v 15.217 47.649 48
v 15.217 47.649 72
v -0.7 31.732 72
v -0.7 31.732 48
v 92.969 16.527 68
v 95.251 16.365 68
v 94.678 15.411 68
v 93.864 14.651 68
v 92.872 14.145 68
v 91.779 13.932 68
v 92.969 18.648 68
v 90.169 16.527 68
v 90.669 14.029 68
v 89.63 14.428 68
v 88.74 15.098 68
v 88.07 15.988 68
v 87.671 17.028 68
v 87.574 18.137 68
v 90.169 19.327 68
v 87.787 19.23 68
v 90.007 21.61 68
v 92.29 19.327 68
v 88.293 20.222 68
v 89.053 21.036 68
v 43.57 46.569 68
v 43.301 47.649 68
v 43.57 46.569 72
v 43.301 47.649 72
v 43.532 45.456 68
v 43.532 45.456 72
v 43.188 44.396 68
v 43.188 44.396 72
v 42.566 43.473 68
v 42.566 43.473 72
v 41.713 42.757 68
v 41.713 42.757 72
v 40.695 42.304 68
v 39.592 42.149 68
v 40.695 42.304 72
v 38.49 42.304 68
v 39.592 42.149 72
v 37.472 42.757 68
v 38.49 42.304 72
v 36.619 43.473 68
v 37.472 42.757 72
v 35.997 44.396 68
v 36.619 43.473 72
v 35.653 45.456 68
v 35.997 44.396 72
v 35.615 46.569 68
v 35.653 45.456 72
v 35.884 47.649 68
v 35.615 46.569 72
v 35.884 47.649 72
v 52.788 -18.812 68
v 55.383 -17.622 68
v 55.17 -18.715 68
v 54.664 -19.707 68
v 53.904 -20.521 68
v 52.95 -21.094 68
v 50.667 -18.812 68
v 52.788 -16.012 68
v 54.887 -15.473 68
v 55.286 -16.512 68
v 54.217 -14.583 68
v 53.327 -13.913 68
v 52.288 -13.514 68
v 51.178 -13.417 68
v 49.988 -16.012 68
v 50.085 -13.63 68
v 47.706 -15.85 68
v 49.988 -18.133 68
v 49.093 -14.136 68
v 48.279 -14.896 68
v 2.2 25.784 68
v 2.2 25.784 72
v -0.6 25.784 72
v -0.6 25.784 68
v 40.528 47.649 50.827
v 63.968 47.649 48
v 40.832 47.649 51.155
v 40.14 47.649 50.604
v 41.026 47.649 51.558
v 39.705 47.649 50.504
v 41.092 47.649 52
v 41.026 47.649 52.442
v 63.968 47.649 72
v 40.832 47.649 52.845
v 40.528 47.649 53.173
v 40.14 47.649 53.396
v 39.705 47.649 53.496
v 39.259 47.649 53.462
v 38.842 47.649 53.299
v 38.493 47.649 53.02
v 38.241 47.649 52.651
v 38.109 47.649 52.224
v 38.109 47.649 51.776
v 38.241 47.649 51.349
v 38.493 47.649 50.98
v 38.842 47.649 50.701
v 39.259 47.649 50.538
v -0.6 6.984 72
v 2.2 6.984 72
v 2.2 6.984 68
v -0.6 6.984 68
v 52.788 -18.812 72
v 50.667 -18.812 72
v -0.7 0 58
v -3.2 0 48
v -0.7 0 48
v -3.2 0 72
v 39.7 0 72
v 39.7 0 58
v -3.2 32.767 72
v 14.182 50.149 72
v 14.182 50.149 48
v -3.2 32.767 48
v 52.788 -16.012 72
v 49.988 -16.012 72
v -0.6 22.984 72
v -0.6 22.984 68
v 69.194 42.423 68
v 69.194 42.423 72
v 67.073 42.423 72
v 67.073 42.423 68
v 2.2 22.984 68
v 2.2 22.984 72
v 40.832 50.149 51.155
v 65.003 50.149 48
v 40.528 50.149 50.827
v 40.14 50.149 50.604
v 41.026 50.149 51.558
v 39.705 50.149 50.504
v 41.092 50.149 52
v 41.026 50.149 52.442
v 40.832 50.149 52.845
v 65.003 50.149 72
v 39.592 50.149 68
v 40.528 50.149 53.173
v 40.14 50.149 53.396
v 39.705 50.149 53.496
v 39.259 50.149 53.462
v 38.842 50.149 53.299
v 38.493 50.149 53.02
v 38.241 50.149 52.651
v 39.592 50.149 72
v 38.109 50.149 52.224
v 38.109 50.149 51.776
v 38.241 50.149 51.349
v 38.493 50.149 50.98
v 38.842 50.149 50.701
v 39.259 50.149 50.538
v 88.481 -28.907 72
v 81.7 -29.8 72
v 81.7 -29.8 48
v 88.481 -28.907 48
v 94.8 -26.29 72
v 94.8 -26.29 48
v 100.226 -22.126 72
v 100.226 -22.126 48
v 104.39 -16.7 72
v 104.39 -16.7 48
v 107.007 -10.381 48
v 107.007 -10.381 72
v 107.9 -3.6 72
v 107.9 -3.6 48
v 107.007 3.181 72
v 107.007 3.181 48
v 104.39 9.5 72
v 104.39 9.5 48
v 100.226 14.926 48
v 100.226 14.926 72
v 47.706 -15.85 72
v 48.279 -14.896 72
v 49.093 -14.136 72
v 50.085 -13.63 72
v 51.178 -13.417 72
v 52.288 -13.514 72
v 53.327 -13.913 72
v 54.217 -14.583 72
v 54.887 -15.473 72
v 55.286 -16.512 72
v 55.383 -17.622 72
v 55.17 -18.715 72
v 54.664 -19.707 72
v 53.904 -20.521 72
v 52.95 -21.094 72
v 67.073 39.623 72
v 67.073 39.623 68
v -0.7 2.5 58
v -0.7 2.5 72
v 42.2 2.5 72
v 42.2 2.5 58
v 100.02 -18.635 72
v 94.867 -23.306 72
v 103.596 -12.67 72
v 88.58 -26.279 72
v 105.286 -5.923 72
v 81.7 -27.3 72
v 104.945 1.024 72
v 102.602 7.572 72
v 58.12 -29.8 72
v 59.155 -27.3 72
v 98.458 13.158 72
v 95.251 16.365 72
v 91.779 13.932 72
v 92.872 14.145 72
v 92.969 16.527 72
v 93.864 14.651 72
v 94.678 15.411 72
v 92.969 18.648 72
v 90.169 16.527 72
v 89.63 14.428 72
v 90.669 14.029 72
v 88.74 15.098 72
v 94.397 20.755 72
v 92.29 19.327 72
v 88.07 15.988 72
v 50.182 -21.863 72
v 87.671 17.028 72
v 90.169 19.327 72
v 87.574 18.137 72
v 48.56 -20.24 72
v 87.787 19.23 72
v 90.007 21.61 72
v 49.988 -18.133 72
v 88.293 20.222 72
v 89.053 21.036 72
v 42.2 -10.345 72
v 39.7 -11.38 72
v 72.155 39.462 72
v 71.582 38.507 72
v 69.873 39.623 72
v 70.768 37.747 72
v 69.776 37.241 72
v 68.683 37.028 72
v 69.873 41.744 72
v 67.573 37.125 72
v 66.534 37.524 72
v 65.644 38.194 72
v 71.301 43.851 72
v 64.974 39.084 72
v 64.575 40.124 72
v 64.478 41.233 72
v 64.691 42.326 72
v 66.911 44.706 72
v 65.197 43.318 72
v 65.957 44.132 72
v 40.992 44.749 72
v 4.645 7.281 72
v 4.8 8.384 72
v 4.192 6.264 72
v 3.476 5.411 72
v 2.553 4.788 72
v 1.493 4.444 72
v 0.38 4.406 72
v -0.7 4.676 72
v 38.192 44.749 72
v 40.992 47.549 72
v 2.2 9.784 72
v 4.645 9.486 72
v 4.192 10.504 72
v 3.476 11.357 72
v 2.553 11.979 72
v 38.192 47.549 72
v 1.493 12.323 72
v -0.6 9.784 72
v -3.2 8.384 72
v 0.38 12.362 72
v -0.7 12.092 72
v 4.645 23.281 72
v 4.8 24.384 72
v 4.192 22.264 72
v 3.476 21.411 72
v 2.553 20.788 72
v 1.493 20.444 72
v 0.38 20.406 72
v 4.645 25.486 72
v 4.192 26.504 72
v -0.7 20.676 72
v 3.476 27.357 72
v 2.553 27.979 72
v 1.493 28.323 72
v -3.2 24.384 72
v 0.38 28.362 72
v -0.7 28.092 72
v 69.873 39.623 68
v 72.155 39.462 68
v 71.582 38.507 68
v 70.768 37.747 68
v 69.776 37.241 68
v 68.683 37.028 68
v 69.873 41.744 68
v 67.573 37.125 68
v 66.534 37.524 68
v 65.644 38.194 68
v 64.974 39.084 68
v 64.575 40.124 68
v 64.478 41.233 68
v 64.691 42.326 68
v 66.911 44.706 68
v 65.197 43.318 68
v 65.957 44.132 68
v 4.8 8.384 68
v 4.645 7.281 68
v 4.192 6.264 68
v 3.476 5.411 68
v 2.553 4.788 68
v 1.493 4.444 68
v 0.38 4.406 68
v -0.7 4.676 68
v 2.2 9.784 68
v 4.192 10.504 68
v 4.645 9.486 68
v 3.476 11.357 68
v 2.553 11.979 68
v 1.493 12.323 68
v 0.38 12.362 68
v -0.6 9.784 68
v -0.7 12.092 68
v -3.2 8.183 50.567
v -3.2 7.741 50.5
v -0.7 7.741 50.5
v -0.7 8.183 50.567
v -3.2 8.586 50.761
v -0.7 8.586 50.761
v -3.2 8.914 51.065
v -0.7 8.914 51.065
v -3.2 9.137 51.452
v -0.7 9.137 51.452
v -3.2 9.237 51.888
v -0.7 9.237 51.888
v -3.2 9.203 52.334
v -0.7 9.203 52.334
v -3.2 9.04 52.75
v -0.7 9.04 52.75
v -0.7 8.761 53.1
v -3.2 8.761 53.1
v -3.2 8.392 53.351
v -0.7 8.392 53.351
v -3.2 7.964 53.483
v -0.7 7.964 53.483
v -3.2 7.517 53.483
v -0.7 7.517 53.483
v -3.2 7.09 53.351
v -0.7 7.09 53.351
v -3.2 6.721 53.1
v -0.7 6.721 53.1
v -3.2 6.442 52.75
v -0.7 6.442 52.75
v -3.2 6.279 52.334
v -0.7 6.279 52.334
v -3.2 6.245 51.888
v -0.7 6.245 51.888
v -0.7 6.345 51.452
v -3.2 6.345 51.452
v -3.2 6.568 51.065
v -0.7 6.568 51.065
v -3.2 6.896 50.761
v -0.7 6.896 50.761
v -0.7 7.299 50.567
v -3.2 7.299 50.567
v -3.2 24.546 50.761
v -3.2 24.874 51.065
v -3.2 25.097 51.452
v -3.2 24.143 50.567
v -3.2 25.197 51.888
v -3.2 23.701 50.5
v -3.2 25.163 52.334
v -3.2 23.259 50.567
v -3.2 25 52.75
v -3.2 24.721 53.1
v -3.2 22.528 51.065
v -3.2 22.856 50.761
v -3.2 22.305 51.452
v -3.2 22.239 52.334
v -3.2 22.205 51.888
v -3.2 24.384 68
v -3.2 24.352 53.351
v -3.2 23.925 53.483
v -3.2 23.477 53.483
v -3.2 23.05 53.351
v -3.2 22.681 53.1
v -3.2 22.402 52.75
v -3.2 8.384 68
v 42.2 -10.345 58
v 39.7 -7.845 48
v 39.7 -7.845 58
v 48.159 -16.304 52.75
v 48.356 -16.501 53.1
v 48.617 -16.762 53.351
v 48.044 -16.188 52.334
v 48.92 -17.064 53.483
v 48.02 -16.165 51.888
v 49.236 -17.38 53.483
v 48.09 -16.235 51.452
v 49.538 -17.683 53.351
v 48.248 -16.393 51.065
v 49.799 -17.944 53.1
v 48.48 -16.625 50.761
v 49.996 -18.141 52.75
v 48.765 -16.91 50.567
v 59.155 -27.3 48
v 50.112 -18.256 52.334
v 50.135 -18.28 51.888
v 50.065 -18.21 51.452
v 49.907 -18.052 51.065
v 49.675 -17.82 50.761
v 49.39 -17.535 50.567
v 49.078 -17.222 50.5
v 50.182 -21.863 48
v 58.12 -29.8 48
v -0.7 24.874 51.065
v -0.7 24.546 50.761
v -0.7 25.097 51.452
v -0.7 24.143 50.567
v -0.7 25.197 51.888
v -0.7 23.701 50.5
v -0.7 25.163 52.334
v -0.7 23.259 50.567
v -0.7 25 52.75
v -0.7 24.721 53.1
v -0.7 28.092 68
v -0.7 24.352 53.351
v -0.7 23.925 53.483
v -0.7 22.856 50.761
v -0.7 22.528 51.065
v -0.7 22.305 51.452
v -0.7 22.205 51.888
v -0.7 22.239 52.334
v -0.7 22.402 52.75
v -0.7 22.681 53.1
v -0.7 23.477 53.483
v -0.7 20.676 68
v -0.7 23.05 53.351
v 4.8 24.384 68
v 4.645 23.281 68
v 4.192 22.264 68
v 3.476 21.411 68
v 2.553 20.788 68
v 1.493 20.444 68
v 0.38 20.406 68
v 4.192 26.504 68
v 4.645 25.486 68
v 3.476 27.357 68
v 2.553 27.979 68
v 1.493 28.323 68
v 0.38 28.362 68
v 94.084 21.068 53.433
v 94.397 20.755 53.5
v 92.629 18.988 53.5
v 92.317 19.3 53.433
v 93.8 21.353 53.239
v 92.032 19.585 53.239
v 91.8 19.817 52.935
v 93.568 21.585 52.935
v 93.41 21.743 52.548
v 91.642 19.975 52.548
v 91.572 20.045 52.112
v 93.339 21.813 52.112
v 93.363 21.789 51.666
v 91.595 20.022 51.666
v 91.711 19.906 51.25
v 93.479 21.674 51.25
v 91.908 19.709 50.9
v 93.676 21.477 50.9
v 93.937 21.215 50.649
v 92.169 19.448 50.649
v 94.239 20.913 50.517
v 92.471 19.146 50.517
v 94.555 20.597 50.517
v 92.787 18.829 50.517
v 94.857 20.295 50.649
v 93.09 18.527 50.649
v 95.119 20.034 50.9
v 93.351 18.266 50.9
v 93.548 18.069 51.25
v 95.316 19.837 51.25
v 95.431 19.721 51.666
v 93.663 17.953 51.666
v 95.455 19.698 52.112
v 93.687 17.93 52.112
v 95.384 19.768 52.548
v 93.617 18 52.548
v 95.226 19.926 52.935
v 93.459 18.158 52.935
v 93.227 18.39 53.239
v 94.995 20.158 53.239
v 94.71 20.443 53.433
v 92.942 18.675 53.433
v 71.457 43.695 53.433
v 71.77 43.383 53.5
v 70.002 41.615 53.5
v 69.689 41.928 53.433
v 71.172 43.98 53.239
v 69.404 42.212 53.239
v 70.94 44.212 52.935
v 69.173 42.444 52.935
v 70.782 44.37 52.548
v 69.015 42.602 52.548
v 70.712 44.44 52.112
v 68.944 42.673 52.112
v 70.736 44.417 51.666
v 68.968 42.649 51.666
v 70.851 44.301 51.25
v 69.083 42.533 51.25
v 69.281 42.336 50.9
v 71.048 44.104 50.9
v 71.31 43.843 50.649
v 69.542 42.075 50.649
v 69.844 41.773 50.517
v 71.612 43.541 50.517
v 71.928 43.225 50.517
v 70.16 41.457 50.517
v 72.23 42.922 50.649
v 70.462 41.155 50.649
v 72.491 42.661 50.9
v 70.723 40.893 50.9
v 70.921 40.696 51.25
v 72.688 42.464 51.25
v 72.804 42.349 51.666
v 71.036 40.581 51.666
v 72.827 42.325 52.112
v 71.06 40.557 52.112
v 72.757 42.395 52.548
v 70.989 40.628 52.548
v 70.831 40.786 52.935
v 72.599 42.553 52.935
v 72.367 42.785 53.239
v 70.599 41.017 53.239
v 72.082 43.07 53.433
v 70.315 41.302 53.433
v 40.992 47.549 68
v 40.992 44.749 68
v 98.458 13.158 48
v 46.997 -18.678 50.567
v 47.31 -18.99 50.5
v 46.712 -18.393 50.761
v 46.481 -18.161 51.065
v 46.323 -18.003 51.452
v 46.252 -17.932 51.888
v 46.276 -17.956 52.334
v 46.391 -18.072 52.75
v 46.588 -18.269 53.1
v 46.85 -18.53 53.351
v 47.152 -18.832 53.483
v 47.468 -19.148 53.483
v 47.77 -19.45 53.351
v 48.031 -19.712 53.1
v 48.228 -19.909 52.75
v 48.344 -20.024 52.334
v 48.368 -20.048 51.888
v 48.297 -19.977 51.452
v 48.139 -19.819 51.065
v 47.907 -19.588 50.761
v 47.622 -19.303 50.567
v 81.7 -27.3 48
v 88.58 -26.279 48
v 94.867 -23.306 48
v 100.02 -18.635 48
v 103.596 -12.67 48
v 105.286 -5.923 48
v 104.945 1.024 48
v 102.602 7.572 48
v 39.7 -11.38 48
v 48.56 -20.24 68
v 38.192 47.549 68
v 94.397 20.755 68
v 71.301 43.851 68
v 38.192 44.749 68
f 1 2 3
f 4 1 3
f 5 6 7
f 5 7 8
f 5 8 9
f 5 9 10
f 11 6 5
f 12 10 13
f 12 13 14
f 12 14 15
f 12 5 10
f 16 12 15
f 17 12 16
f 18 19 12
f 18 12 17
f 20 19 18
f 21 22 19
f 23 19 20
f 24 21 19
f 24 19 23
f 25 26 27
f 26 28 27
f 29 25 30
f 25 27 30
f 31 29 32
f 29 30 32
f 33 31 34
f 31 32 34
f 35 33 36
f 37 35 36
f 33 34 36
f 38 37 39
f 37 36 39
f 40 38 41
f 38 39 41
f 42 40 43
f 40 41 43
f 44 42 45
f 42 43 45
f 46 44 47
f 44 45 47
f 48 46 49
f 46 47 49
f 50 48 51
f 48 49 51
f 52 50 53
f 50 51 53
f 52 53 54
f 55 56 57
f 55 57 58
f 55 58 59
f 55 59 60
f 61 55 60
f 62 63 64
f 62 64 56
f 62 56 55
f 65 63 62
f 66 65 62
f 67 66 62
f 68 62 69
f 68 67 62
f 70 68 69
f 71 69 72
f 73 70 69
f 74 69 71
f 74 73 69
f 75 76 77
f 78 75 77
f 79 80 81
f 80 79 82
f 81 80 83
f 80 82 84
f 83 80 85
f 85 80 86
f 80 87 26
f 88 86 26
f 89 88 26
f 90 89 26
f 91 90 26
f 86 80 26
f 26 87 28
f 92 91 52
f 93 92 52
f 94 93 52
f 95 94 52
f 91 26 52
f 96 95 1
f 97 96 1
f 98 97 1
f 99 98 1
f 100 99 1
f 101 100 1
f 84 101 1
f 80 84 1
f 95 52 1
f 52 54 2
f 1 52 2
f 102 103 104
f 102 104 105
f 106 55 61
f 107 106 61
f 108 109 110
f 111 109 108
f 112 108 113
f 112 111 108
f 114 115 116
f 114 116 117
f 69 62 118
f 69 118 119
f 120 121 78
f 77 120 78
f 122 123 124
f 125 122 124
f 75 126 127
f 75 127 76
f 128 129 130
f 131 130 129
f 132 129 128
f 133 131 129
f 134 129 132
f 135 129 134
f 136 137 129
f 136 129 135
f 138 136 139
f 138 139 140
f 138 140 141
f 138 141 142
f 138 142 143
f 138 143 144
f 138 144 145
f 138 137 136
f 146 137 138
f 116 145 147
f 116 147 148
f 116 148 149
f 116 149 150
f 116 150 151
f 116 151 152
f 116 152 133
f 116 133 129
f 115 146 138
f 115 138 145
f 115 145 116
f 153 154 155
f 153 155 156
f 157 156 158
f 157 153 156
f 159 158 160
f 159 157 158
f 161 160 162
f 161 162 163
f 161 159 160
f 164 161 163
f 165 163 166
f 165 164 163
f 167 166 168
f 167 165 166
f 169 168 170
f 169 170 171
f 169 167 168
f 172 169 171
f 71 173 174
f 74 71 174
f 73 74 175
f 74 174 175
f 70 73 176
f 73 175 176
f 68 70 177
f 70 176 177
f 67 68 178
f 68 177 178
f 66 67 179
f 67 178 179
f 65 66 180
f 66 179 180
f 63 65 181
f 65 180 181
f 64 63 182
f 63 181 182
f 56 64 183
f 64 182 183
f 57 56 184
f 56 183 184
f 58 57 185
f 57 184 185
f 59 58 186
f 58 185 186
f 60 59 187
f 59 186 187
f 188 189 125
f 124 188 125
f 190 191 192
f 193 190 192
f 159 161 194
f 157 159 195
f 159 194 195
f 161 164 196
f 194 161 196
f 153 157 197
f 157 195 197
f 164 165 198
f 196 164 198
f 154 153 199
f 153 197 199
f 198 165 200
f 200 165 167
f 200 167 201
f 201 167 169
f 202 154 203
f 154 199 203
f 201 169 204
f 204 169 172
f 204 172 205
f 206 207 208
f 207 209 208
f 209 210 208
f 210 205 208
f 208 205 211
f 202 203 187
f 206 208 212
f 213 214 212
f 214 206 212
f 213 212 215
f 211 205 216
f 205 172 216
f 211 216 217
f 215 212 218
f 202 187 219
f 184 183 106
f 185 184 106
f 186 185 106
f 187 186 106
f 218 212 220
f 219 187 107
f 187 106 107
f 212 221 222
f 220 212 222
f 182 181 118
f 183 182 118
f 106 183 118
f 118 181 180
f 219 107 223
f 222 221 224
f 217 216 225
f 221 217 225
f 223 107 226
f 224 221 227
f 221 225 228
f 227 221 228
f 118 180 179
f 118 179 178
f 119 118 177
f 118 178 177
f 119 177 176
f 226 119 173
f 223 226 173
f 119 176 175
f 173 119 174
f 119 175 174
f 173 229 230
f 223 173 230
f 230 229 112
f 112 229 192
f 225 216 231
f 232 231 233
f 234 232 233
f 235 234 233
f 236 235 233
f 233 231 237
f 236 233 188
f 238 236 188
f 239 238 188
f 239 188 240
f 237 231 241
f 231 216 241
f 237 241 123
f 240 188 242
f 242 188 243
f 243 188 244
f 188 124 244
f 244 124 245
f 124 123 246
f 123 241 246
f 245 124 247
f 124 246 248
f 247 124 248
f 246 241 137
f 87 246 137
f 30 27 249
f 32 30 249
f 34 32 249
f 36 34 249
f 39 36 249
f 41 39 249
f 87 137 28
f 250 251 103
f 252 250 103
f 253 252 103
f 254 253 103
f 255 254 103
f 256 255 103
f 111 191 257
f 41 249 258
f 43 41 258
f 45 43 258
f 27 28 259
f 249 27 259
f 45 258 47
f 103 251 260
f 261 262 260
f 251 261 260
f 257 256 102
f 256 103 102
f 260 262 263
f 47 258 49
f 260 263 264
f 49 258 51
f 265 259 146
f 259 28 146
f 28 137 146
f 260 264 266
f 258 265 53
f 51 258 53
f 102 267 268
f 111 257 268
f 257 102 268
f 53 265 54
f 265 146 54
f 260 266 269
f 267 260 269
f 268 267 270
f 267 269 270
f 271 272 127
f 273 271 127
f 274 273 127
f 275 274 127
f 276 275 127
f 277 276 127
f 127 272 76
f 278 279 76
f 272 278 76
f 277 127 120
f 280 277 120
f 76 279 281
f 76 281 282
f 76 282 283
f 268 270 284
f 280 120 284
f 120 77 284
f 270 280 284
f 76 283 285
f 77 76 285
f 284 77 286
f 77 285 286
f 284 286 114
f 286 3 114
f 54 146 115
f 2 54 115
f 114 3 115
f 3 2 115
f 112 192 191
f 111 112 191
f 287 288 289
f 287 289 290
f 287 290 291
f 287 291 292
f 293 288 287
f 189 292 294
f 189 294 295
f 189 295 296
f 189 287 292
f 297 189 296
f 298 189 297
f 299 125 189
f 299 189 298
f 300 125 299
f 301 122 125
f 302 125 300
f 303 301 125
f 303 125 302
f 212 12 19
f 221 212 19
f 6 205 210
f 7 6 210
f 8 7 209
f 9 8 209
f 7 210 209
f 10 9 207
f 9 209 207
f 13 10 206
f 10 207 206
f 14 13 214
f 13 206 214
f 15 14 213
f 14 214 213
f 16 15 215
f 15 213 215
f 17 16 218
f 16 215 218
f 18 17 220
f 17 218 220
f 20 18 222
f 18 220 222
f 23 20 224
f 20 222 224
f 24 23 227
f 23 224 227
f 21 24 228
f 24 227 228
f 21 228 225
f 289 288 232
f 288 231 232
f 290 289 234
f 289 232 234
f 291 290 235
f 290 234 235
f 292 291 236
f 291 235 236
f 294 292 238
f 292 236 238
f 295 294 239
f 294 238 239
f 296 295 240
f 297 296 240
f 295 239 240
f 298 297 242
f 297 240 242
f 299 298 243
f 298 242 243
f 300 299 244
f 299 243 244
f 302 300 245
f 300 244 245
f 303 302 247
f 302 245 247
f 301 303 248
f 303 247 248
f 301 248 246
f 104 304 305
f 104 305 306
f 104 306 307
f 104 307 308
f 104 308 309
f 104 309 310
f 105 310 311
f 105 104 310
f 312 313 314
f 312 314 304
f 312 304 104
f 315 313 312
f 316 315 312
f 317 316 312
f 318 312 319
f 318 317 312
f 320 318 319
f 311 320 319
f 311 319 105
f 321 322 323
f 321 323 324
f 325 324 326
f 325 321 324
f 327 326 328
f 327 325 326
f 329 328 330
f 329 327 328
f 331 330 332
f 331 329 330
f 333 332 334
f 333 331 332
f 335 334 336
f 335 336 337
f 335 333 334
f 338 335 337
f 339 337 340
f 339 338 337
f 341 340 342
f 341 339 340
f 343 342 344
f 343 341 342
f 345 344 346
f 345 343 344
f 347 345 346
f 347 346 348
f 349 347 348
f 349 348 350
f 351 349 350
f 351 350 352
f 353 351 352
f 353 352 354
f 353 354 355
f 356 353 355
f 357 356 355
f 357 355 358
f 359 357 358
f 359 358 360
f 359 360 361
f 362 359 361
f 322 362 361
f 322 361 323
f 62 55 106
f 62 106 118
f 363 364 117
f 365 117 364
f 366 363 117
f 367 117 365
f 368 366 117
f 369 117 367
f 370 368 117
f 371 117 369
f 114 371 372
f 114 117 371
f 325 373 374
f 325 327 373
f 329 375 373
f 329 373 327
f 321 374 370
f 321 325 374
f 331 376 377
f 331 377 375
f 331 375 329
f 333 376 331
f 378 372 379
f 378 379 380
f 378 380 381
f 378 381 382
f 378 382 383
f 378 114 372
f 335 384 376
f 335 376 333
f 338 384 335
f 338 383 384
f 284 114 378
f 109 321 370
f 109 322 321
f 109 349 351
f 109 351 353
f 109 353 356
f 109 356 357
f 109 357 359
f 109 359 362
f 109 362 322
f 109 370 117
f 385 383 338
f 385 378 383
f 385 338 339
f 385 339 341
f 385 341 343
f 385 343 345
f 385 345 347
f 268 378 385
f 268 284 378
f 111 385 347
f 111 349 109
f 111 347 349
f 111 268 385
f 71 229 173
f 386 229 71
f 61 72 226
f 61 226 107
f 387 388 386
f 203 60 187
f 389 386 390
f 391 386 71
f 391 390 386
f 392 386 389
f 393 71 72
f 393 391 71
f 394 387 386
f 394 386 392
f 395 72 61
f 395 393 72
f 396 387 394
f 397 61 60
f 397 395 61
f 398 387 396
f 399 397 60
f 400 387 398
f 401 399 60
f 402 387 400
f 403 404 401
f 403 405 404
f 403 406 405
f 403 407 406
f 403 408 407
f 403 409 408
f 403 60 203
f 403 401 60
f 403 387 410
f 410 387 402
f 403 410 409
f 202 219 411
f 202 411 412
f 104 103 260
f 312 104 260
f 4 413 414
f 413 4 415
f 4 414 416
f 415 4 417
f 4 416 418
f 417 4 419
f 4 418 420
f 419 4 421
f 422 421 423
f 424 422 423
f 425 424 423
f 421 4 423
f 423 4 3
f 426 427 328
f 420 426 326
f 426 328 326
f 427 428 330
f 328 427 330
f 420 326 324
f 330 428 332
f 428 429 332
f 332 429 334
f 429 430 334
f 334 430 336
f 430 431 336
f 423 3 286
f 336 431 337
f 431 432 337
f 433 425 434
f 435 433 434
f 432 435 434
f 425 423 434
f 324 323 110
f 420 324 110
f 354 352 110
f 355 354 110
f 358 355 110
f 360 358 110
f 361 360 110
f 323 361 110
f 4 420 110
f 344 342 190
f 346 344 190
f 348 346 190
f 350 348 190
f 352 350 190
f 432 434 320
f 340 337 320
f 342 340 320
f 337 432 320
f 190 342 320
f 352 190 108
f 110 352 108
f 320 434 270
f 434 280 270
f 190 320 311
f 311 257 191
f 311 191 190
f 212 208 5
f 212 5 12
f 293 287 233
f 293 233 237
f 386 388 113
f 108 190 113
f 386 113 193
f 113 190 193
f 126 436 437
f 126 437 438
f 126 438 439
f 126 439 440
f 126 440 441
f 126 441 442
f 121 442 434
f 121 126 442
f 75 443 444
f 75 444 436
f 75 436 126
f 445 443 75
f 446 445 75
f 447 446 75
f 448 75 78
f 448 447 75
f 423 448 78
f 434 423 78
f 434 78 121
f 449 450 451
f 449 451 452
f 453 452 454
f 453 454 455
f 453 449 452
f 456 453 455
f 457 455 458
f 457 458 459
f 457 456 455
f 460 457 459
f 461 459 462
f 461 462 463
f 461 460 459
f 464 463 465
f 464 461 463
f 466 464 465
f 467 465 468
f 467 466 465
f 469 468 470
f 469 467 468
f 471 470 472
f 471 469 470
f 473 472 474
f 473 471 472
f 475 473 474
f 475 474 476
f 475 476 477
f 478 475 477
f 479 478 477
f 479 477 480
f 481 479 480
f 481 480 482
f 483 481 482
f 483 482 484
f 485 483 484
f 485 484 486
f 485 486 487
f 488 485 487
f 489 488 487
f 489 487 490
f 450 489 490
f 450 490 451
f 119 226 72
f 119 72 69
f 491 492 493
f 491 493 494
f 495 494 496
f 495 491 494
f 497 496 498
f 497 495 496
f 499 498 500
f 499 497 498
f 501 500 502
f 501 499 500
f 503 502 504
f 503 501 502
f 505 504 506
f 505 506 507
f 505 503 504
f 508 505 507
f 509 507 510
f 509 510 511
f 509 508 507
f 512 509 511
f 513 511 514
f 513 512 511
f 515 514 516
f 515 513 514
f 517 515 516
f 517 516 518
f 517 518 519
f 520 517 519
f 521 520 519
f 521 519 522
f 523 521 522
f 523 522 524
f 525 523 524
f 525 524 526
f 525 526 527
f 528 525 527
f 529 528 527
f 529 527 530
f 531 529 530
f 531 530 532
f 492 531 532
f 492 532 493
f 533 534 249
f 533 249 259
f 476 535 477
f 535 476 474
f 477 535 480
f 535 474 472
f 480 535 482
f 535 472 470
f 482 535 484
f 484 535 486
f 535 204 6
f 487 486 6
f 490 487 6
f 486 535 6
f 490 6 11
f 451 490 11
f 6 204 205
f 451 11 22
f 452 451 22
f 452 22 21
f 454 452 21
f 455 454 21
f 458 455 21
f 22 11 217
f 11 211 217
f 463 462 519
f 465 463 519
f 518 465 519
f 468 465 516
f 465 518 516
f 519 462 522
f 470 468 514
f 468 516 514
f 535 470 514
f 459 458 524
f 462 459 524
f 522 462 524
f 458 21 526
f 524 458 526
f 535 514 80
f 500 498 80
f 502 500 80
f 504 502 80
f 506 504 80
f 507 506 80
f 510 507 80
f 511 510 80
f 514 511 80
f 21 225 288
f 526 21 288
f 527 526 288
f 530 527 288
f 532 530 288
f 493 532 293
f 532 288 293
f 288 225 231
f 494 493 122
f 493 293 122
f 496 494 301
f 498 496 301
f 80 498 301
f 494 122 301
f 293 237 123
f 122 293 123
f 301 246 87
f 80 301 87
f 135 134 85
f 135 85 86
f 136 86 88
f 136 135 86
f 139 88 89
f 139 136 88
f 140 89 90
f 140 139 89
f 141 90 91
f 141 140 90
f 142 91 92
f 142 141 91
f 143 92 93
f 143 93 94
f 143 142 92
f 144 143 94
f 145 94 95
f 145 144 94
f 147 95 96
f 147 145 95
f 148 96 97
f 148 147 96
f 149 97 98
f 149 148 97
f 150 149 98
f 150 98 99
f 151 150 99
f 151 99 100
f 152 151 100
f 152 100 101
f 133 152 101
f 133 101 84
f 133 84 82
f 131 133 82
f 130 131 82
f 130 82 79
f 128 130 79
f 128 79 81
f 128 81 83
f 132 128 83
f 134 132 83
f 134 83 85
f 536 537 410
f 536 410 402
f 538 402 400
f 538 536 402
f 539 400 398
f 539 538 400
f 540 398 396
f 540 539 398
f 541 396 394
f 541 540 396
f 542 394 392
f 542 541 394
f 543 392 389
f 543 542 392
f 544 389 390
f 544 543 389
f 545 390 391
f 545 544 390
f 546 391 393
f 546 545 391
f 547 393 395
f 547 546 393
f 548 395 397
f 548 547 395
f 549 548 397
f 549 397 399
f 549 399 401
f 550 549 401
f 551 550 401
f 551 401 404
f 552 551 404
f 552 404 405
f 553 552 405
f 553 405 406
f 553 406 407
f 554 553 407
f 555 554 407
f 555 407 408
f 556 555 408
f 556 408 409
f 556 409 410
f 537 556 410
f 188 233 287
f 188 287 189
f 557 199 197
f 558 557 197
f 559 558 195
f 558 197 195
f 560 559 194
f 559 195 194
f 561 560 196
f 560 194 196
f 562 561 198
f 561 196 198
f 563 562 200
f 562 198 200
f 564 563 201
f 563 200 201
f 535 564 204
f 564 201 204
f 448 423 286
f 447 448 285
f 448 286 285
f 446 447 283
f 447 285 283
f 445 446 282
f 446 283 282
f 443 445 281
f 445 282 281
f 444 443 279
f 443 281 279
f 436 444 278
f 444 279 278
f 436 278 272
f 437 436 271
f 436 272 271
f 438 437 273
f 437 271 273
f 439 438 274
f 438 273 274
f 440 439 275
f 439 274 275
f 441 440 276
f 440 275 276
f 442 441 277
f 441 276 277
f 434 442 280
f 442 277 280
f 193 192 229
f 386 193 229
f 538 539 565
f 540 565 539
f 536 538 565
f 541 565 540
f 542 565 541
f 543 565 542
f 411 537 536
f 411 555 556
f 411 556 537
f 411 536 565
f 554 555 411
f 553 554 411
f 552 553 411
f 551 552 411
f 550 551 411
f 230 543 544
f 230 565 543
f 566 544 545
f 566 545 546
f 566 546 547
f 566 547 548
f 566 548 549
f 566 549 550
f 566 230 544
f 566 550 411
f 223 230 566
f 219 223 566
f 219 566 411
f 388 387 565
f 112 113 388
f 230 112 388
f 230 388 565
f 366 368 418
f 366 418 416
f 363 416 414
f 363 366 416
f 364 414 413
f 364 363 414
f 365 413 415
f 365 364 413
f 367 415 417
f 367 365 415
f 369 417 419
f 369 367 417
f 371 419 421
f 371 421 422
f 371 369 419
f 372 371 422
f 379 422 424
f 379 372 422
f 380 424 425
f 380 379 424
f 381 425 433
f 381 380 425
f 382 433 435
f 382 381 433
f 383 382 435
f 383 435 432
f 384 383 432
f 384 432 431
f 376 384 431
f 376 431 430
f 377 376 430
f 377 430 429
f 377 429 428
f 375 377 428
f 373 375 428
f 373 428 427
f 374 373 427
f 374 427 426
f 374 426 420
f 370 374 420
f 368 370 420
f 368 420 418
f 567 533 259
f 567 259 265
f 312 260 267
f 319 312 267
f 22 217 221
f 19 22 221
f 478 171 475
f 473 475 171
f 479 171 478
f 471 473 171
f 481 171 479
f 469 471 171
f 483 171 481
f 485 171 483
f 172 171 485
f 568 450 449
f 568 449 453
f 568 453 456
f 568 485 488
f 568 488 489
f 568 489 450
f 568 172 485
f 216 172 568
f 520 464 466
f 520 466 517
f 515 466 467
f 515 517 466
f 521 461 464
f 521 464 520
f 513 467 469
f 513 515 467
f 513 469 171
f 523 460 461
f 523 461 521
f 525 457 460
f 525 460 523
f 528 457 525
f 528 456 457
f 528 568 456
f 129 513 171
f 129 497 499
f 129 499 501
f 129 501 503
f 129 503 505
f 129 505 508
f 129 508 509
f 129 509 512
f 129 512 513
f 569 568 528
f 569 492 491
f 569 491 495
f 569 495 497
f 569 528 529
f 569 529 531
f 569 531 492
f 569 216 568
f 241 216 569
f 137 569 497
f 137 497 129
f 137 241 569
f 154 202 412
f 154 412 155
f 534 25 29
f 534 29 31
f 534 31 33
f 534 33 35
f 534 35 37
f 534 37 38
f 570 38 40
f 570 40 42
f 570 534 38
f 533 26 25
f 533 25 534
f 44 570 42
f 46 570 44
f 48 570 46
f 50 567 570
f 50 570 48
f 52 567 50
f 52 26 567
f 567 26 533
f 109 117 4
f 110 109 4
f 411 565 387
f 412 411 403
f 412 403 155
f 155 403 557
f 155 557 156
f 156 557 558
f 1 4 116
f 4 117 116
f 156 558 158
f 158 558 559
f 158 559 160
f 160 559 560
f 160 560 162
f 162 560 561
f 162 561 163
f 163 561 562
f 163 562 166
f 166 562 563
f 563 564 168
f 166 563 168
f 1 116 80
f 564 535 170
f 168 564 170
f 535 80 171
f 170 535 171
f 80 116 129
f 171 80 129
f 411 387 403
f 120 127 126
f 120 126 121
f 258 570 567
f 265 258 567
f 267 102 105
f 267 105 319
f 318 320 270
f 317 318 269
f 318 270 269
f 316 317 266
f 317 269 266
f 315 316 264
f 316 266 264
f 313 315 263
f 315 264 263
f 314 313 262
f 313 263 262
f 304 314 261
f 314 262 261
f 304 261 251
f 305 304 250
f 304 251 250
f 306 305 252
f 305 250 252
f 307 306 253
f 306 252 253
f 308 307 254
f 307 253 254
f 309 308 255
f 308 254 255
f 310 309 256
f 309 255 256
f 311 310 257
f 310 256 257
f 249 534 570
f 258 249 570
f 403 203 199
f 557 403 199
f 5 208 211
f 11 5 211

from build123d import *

# Parameters (mm, degrees)
RESSALTO_EXTRUS_O1_DEPTH = 48
ESBO_O12_R               = 1.5
CORTE_EXTRUS_O10_DEPTH   = 10
ESBO_O13_R               = 1.5
CORTE_EXTRUS_O11_DEPTH   = 10
ESBO_O14_R               = 1.5
CORTE_EXTRUS_O12_DEPTH   = 10
ESBO_O15_R               = 1.5
CORTE_EXTRUS_O13_DEPTH   = 10
CORTE_EXTRUS_O14_DEPTH   = 10
CORTE_EXTRUS_O15_DEPTH   = 24
ESBO_O17_R               = 4
ESBO_O17_W               = 2.8
ESBO_O17_H               = 2.8
RESSALTO_EXTRUS_O2_DEPTH = 4
CORTE_EXTRUS_O16_DEPTH   = 24


with BuildPart() as part:
    # Model → Ressalto-extrusão1 (new body)
    with BuildSketch(Plane.XY):
        with BuildLine():
            Line((-0.7, 0), (39, 0))
            Line((39, 0), (39.7, 0))
            Line((39.7, 0), (39.7, -11.380317396))
            Line((39.7, -11.380317396), (50.182424304, -21.8627417))
            Line((50.182424304, -21.8627417), (58.119682605, -29.8))
            Line((58.119682605, -29.8), (81.7, -29.8))
            ThreePointArc((81.7, -29.8), (105.905643752, -13.626305928), (100.226197667, 14.926197667))
            Line((100.226197667, 14.926197667), (65.00338056, 50.149014774))
            Line((65.00338056, 50.149014774), (50.111140335, 50.149014774))
            Line((50.111140335, 50.149014774), (14.181595121, 50.149014774))
            Line((14.181595121, 50.149014774), (-3.2, 32.767419653))
            Line((-3.2, 32.767419653), (-3.2, 5))
            Line((-3.2, 5), (-3.2, 0))
            Line((-3.2, 0), (-0.7, 0))
        make_face()
        with BuildLine():
            Line((-0.7, 2.5), (39, 2.5))
            Line((39, 2.5), (39.7, 2.5))
            Line((39.7, 2.5), (42.2, 2.5))
            Line((42.2, 2.5), (42.2, -10.34478349))
            Line((42.2, -10.34478349), (51.950191257, -20.094974747))
            Line((51.950191257, -20.094974747), (59.15521651, -27.3))
            Line((59.15521651, -27.3), (81.7, -27.3))
            ThreePointArc((81.7, -27.3), (103.595944921, -12.669597347), (98.458430714, 13.158430714))
            Line((98.458430714, 13.158430714), (63.967846654, 47.649014774))
            Line((63.967846654, 47.649014774), (50.111140335, 47.649014774))
            Line((50.111140335, 47.649014774), (15.217129027, 47.649014774))
            Line((15.217129027, 47.649014774), (-0.7, 31.731885747))
            Line((-0.7, 31.731885747), (-0.7, 2.5))
        make_face(mode=Mode.SUBTRACT)
    extrude(amount=RESSALTO_EXTRUS_O1_DEPTH)

    # Esboço12 → Corte-extrusão10 (cut)
    with BuildSketch(Plane(origin=(57.576197667, 57.576197667, 0), x_dir=(0, 0, -1), z_dir=(0.707106781, 0.707106781, 0))):
        with Locations((-44, -20.072657306)):
            Circle(ESBO_O12_R)
        with Locations((-44, -52.072657306)):
            Circle(ESBO_O12_R)
    extrude(amount=-CORTE_EXTRUS_O10_DEPTH, mode=Mode.SUBTRACT)

    # Esboço13 → Corte-extrusão11 (cut)
    with BuildSketch(Plane(origin=(0, 50.149014774, 0), x_dir=(1, 0, 0), z_dir=(0, 1, 0))):
        with Locations((39.59248784, -44)):
            Circle(ESBO_O13_R)
    extrude(amount=-CORTE_EXTRUS_O11_DEPTH, mode=Mode.SUBTRACT)

    # Esboço14 → Corte-extrusão12 (cut)
    with BuildSketch(Plane.ZY.offset(3.2)):
        with Locations((44, 23.701037279)):
            Circle(ESBO_O14_R)
        with Locations((44, 7.740898975)):
            Circle(ESBO_O14_R)
    extrude(amount=-CORTE_EXTRUS_O12_DEPTH, mode=Mode.SUBTRACT)

    # Esboço15 → Corte-extrusão13 (cut)
    with BuildSketch(Plane(origin=(14.159841302, 14.159841302, 0), x_dir=(0, 0, 1), z_dir=(-0.707106781, -0.707106781, 0))):
        with Locations((44, -46.881179593)):
            Circle(ESBO_O15_R)
    extrude(amount=-CORTE_EXTRUS_O13_DEPTH, mode=Mode.SUBTRACT)

    # Esboço16 → Corte-extrusão14 (cut)
    with BuildSketch(Plane.XY.offset(48)):
        Polygon((39.7, 0), (39.7, -7.84478349), (42.2, -10.34478349), (42.2, 2.5), (-0.7, 2.5), (-0.7, 0), align=None)
    extrude(amount=-CORTE_EXTRUS_O14_DEPTH, mode=Mode.SUBTRACT)

    # Esboço18 → Corte-extrusão15 (cut)
    with BuildSketch(Plane(origin=(0, 0, 0), x_dir=(-1, 0, 0), z_dir=(0, 0, -1))):
        with BuildLine():
            Line((-39.7, 0), (3.2, 0))
            Line((3.2, 0), (3.2, 32.767419653))
            Line((3.2, 32.767419653), (-14.181595121, 50.149014774))
            Line((-14.181595121, 50.149014774), (-65.00338056, 50.149014774))
            Line((-65.00338056, 50.149014774), (-100.226197667, 14.926197667))
            ThreePointArc((-100.226197667, 14.926197667), (-105.905643752, -13.626305928), (-81.7, -29.8))
            Line((-81.7, -29.8), (-58.119682605, -29.8))
            Line((-58.119682605, -29.8), (-39.7, -11.380317396))
            Line((-39.7, -11.380317396), (-39.7, 0))
        make_face()
    extrude(amount=-CORTE_EXTRUS_O15_DEPTH, mode=Mode.SUBTRACT)

    # Esboço17 → Ressalto-extrusão2 (add)
    with BuildSketch(Plane(origin=(0, 0, 24), x_dir=(-1, 0, 0), z_dir=(0, 0, -1))):
        with Locations((-91.568699638, 17.926841447)):
            Circle(ESBO_O17_R)
        with Locations((-91.568699638, 17.926841447)):
            Rectangle(ESBO_O17_W, ESBO_O17_H, mode=Mode.SUBTRACT)
        with Locations((-68.47265349, 41.022887595)):
            Circle(ESBO_O17_R)
        with Locations((-68.47265349, 41.022887595)):
            Rectangle(ESBO_O17_W, ESBO_O17_H, mode=Mode.SUBTRACT)
        with Locations((-39.59248784, 46.149014774)):
            Circle(ESBO_O17_R)
        with Locations((-39.59248784, 46.149014774)):
            Rectangle(ESBO_O17_W, ESBO_O17_H, mode=Mode.SUBTRACT)
        with Locations((-0.8, 24.383709827)):
            Circle(ESBO_O17_R)
        with Locations((-0.8, 24.383709827)):
            Rectangle(ESBO_O17_W, ESBO_O17_H, mode=Mode.SUBTRACT)
        with Locations((-0.8, 8.383709827)):
            Circle(ESBO_O17_R)
        with Locations((-0.8, 8.383709827)):
            Rectangle(ESBO_O17_W, ESBO_O17_H, mode=Mode.SUBTRACT)
        with Locations((-51.388268427, -17.411731573)):
            Circle(ESBO_O17_R)
        with Locations((-51.388268427, -17.411731573)):
            Rectangle(ESBO_O17_W, ESBO_O17_H, mode=Mode.SUBTRACT)
    extrude(amount=-RESSALTO_EXTRUS_O2_DEPTH)


with BuildPart() as body_2:
    # Espelhar2: mirrored copy
    add(part.part.mirror(Plane(origin=(81.7, -3.6, 48), x_dir=(1, 0, 0), z_dir=(0, 0, 1))))


with BuildPart() as part_1:
    add(part.part)

    # Esboço19 → Corte-extrusão16 (cut)
    with BuildSketch(Plane(origin=(0, 0, 24), x_dir=(-1, 0, 0), z_dir=(0, 0, -1))):
        with BuildLine():
            Line((-58.119682605, -29.8), (-39.7, -11.380317396))
            Line((-39.7, -11.380317396), (-39.7, 0))
            Line((-39.7, 0), (3.2, 0))
            Line((3.2, 0), (3.2, 32.767419653))
            Line((3.2, 32.767419653), (-14.181595121, 50.149014774))
            Line((-14.181595121, 50.149014774), (-65.00338056, 50.149014774))
            Line((-65.00338056, 50.149014774), (-100.226197667, 14.926197667))
            ThreePointArc((-100.226197667, 14.926197667), (-105.905643752, -13.626305928), (-81.7, -29.8))
            Line((-81.7, -29.8), (-58.119682605, -29.8))
        make_face()
    extrude(amount=-CORTE_EXTRUS_O16_DEPTH, mode=Mode.SUBTRACT)


solid = body_2.part
